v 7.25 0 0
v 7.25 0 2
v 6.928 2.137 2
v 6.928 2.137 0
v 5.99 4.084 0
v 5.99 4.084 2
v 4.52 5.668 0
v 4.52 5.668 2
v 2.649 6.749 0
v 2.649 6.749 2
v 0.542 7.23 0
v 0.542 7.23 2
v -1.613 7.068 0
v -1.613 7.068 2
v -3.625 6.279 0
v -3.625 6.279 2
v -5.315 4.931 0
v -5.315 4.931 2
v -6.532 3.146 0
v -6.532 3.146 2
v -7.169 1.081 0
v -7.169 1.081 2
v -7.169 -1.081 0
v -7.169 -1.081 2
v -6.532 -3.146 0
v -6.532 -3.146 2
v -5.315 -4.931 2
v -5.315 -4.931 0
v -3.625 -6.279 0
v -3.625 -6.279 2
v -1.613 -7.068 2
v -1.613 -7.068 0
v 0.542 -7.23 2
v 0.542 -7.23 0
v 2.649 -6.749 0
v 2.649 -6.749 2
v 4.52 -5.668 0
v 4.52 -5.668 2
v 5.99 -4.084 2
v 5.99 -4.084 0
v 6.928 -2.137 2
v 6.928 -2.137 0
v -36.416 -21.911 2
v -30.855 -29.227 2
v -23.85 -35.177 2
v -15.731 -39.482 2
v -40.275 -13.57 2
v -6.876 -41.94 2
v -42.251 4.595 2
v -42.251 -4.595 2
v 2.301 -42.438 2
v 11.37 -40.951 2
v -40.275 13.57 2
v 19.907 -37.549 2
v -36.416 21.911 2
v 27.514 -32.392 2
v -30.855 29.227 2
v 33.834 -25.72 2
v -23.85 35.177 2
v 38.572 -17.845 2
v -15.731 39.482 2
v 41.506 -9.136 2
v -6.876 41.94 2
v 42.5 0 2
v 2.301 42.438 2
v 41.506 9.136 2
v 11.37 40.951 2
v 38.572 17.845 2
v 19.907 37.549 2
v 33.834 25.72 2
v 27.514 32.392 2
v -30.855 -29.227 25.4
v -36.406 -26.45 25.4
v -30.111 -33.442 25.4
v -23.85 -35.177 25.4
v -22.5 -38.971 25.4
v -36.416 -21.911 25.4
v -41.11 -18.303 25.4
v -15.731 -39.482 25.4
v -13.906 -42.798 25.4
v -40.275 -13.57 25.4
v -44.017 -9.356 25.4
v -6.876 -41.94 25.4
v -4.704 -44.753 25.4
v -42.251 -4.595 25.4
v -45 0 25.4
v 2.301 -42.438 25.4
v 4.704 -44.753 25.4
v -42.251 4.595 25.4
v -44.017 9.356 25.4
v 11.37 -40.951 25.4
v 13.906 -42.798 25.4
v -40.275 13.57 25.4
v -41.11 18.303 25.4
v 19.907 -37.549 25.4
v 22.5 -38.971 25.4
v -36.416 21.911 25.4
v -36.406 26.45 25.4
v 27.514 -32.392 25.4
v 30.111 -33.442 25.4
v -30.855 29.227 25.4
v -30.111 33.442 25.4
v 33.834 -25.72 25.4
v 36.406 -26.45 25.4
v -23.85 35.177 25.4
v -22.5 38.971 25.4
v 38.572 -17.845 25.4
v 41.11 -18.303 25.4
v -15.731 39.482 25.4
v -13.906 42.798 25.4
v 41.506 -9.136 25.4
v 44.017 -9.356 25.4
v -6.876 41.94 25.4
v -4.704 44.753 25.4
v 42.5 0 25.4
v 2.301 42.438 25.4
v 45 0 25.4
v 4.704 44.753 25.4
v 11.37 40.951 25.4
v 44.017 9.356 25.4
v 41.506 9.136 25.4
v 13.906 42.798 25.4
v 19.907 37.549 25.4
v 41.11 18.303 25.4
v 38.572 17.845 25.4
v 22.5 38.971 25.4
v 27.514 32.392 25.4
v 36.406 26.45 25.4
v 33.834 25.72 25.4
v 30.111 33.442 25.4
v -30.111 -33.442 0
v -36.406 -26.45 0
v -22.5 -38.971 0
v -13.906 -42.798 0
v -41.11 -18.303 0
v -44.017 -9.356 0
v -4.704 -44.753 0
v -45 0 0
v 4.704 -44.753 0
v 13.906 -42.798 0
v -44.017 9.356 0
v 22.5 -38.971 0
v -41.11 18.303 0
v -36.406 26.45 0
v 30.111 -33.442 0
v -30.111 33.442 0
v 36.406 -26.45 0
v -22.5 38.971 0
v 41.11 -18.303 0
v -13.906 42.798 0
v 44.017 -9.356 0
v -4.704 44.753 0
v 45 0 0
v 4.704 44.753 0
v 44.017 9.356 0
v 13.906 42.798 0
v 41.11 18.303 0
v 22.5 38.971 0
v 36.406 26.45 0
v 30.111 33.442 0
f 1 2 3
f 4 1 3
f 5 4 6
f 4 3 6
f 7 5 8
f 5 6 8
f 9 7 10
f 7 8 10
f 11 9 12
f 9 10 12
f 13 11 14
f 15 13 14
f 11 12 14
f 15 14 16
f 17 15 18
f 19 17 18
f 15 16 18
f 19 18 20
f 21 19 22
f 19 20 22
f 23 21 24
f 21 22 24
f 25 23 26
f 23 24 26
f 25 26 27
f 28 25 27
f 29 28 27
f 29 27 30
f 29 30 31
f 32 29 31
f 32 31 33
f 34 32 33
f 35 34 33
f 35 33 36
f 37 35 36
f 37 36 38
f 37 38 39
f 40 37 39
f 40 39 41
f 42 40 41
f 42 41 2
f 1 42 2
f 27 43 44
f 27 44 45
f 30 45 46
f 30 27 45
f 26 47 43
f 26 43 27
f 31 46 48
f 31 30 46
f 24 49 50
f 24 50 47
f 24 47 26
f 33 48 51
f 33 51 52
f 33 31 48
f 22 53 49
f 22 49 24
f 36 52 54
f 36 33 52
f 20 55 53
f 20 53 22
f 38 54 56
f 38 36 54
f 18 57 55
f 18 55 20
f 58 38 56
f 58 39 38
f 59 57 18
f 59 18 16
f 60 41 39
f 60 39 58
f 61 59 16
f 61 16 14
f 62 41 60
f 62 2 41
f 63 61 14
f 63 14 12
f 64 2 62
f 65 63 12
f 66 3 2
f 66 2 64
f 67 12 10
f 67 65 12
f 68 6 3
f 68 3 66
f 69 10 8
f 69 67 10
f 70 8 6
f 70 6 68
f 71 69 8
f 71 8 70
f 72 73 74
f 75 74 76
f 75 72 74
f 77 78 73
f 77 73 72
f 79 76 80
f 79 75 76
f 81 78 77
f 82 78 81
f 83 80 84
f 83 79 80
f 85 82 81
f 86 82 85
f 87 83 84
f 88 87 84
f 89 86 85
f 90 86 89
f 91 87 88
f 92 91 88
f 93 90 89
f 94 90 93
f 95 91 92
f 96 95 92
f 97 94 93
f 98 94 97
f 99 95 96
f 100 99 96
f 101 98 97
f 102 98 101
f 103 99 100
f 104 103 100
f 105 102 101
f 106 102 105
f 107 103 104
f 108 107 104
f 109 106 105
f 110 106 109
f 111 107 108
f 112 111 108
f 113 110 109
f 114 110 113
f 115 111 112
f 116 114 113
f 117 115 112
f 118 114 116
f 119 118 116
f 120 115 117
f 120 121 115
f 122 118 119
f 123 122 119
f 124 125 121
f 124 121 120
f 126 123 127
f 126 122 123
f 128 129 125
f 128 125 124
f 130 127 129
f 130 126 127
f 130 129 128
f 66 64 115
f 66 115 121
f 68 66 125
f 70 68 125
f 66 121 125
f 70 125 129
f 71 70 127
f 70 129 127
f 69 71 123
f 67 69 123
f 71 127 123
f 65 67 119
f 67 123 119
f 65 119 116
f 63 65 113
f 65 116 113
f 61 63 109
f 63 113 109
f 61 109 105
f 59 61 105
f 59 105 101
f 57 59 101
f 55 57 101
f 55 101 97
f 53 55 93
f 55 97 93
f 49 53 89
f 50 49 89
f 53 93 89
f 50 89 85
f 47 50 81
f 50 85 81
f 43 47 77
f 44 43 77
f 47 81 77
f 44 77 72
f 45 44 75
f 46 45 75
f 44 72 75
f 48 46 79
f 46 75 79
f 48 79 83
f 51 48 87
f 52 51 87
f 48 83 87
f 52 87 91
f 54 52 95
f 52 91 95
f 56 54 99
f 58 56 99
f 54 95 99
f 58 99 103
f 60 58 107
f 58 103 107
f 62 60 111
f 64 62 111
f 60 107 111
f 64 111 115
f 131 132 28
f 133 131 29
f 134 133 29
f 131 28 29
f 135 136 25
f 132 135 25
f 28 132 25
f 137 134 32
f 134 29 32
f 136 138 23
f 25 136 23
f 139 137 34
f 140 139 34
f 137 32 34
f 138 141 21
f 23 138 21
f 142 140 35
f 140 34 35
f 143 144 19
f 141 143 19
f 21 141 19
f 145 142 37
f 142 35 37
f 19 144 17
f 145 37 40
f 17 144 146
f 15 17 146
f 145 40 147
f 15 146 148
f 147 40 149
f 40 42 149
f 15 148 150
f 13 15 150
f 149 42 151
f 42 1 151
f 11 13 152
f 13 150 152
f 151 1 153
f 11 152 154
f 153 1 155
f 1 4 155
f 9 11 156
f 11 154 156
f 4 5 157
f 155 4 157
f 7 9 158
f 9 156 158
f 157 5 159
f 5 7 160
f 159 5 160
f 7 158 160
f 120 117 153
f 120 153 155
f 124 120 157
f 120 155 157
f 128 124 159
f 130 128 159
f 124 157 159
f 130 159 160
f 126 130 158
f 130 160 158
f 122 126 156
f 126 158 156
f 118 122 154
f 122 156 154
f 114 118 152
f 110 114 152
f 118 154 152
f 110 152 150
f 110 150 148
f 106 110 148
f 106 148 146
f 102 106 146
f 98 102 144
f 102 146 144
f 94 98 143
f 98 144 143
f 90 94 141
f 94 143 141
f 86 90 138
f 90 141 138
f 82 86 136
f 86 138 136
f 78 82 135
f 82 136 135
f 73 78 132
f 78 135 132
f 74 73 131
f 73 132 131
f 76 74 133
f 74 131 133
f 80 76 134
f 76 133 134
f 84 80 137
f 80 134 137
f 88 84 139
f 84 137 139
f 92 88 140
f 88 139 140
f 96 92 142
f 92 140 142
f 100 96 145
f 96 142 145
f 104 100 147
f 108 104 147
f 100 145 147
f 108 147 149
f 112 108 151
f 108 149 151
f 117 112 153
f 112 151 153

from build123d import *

# Parameters (mm, degrees)
F0_R     = 45
F1_DEPTH = 25.4
F2_R     = 42.5
F3_DEPTH = 23.4
F4_R     = 7.25
F5_DEPTH = 25


with BuildPart() as f1:
    # F0 (on Top) → F1 (new body)
    with BuildSketch(Plane.XY):
        Circle(F0_R)
    extrude(amount=F1_DEPTH)

    # F2 (on face) → F3 (cut, through all)
    with BuildSketch(Plane.XY.offset(25.4)):
        Circle(F2_R)
    extrude(amount=-F3_DEPTH, mode=Mode.SUBTRACT)

    # F4 (on face) → F5 (cut)
    with BuildSketch(Plane.XY.offset(2)):
        Circle(F4_R)
    extrude(amount=-F5_DEPTH, mode=Mode.SUBTRACT)


solid = f1.part
